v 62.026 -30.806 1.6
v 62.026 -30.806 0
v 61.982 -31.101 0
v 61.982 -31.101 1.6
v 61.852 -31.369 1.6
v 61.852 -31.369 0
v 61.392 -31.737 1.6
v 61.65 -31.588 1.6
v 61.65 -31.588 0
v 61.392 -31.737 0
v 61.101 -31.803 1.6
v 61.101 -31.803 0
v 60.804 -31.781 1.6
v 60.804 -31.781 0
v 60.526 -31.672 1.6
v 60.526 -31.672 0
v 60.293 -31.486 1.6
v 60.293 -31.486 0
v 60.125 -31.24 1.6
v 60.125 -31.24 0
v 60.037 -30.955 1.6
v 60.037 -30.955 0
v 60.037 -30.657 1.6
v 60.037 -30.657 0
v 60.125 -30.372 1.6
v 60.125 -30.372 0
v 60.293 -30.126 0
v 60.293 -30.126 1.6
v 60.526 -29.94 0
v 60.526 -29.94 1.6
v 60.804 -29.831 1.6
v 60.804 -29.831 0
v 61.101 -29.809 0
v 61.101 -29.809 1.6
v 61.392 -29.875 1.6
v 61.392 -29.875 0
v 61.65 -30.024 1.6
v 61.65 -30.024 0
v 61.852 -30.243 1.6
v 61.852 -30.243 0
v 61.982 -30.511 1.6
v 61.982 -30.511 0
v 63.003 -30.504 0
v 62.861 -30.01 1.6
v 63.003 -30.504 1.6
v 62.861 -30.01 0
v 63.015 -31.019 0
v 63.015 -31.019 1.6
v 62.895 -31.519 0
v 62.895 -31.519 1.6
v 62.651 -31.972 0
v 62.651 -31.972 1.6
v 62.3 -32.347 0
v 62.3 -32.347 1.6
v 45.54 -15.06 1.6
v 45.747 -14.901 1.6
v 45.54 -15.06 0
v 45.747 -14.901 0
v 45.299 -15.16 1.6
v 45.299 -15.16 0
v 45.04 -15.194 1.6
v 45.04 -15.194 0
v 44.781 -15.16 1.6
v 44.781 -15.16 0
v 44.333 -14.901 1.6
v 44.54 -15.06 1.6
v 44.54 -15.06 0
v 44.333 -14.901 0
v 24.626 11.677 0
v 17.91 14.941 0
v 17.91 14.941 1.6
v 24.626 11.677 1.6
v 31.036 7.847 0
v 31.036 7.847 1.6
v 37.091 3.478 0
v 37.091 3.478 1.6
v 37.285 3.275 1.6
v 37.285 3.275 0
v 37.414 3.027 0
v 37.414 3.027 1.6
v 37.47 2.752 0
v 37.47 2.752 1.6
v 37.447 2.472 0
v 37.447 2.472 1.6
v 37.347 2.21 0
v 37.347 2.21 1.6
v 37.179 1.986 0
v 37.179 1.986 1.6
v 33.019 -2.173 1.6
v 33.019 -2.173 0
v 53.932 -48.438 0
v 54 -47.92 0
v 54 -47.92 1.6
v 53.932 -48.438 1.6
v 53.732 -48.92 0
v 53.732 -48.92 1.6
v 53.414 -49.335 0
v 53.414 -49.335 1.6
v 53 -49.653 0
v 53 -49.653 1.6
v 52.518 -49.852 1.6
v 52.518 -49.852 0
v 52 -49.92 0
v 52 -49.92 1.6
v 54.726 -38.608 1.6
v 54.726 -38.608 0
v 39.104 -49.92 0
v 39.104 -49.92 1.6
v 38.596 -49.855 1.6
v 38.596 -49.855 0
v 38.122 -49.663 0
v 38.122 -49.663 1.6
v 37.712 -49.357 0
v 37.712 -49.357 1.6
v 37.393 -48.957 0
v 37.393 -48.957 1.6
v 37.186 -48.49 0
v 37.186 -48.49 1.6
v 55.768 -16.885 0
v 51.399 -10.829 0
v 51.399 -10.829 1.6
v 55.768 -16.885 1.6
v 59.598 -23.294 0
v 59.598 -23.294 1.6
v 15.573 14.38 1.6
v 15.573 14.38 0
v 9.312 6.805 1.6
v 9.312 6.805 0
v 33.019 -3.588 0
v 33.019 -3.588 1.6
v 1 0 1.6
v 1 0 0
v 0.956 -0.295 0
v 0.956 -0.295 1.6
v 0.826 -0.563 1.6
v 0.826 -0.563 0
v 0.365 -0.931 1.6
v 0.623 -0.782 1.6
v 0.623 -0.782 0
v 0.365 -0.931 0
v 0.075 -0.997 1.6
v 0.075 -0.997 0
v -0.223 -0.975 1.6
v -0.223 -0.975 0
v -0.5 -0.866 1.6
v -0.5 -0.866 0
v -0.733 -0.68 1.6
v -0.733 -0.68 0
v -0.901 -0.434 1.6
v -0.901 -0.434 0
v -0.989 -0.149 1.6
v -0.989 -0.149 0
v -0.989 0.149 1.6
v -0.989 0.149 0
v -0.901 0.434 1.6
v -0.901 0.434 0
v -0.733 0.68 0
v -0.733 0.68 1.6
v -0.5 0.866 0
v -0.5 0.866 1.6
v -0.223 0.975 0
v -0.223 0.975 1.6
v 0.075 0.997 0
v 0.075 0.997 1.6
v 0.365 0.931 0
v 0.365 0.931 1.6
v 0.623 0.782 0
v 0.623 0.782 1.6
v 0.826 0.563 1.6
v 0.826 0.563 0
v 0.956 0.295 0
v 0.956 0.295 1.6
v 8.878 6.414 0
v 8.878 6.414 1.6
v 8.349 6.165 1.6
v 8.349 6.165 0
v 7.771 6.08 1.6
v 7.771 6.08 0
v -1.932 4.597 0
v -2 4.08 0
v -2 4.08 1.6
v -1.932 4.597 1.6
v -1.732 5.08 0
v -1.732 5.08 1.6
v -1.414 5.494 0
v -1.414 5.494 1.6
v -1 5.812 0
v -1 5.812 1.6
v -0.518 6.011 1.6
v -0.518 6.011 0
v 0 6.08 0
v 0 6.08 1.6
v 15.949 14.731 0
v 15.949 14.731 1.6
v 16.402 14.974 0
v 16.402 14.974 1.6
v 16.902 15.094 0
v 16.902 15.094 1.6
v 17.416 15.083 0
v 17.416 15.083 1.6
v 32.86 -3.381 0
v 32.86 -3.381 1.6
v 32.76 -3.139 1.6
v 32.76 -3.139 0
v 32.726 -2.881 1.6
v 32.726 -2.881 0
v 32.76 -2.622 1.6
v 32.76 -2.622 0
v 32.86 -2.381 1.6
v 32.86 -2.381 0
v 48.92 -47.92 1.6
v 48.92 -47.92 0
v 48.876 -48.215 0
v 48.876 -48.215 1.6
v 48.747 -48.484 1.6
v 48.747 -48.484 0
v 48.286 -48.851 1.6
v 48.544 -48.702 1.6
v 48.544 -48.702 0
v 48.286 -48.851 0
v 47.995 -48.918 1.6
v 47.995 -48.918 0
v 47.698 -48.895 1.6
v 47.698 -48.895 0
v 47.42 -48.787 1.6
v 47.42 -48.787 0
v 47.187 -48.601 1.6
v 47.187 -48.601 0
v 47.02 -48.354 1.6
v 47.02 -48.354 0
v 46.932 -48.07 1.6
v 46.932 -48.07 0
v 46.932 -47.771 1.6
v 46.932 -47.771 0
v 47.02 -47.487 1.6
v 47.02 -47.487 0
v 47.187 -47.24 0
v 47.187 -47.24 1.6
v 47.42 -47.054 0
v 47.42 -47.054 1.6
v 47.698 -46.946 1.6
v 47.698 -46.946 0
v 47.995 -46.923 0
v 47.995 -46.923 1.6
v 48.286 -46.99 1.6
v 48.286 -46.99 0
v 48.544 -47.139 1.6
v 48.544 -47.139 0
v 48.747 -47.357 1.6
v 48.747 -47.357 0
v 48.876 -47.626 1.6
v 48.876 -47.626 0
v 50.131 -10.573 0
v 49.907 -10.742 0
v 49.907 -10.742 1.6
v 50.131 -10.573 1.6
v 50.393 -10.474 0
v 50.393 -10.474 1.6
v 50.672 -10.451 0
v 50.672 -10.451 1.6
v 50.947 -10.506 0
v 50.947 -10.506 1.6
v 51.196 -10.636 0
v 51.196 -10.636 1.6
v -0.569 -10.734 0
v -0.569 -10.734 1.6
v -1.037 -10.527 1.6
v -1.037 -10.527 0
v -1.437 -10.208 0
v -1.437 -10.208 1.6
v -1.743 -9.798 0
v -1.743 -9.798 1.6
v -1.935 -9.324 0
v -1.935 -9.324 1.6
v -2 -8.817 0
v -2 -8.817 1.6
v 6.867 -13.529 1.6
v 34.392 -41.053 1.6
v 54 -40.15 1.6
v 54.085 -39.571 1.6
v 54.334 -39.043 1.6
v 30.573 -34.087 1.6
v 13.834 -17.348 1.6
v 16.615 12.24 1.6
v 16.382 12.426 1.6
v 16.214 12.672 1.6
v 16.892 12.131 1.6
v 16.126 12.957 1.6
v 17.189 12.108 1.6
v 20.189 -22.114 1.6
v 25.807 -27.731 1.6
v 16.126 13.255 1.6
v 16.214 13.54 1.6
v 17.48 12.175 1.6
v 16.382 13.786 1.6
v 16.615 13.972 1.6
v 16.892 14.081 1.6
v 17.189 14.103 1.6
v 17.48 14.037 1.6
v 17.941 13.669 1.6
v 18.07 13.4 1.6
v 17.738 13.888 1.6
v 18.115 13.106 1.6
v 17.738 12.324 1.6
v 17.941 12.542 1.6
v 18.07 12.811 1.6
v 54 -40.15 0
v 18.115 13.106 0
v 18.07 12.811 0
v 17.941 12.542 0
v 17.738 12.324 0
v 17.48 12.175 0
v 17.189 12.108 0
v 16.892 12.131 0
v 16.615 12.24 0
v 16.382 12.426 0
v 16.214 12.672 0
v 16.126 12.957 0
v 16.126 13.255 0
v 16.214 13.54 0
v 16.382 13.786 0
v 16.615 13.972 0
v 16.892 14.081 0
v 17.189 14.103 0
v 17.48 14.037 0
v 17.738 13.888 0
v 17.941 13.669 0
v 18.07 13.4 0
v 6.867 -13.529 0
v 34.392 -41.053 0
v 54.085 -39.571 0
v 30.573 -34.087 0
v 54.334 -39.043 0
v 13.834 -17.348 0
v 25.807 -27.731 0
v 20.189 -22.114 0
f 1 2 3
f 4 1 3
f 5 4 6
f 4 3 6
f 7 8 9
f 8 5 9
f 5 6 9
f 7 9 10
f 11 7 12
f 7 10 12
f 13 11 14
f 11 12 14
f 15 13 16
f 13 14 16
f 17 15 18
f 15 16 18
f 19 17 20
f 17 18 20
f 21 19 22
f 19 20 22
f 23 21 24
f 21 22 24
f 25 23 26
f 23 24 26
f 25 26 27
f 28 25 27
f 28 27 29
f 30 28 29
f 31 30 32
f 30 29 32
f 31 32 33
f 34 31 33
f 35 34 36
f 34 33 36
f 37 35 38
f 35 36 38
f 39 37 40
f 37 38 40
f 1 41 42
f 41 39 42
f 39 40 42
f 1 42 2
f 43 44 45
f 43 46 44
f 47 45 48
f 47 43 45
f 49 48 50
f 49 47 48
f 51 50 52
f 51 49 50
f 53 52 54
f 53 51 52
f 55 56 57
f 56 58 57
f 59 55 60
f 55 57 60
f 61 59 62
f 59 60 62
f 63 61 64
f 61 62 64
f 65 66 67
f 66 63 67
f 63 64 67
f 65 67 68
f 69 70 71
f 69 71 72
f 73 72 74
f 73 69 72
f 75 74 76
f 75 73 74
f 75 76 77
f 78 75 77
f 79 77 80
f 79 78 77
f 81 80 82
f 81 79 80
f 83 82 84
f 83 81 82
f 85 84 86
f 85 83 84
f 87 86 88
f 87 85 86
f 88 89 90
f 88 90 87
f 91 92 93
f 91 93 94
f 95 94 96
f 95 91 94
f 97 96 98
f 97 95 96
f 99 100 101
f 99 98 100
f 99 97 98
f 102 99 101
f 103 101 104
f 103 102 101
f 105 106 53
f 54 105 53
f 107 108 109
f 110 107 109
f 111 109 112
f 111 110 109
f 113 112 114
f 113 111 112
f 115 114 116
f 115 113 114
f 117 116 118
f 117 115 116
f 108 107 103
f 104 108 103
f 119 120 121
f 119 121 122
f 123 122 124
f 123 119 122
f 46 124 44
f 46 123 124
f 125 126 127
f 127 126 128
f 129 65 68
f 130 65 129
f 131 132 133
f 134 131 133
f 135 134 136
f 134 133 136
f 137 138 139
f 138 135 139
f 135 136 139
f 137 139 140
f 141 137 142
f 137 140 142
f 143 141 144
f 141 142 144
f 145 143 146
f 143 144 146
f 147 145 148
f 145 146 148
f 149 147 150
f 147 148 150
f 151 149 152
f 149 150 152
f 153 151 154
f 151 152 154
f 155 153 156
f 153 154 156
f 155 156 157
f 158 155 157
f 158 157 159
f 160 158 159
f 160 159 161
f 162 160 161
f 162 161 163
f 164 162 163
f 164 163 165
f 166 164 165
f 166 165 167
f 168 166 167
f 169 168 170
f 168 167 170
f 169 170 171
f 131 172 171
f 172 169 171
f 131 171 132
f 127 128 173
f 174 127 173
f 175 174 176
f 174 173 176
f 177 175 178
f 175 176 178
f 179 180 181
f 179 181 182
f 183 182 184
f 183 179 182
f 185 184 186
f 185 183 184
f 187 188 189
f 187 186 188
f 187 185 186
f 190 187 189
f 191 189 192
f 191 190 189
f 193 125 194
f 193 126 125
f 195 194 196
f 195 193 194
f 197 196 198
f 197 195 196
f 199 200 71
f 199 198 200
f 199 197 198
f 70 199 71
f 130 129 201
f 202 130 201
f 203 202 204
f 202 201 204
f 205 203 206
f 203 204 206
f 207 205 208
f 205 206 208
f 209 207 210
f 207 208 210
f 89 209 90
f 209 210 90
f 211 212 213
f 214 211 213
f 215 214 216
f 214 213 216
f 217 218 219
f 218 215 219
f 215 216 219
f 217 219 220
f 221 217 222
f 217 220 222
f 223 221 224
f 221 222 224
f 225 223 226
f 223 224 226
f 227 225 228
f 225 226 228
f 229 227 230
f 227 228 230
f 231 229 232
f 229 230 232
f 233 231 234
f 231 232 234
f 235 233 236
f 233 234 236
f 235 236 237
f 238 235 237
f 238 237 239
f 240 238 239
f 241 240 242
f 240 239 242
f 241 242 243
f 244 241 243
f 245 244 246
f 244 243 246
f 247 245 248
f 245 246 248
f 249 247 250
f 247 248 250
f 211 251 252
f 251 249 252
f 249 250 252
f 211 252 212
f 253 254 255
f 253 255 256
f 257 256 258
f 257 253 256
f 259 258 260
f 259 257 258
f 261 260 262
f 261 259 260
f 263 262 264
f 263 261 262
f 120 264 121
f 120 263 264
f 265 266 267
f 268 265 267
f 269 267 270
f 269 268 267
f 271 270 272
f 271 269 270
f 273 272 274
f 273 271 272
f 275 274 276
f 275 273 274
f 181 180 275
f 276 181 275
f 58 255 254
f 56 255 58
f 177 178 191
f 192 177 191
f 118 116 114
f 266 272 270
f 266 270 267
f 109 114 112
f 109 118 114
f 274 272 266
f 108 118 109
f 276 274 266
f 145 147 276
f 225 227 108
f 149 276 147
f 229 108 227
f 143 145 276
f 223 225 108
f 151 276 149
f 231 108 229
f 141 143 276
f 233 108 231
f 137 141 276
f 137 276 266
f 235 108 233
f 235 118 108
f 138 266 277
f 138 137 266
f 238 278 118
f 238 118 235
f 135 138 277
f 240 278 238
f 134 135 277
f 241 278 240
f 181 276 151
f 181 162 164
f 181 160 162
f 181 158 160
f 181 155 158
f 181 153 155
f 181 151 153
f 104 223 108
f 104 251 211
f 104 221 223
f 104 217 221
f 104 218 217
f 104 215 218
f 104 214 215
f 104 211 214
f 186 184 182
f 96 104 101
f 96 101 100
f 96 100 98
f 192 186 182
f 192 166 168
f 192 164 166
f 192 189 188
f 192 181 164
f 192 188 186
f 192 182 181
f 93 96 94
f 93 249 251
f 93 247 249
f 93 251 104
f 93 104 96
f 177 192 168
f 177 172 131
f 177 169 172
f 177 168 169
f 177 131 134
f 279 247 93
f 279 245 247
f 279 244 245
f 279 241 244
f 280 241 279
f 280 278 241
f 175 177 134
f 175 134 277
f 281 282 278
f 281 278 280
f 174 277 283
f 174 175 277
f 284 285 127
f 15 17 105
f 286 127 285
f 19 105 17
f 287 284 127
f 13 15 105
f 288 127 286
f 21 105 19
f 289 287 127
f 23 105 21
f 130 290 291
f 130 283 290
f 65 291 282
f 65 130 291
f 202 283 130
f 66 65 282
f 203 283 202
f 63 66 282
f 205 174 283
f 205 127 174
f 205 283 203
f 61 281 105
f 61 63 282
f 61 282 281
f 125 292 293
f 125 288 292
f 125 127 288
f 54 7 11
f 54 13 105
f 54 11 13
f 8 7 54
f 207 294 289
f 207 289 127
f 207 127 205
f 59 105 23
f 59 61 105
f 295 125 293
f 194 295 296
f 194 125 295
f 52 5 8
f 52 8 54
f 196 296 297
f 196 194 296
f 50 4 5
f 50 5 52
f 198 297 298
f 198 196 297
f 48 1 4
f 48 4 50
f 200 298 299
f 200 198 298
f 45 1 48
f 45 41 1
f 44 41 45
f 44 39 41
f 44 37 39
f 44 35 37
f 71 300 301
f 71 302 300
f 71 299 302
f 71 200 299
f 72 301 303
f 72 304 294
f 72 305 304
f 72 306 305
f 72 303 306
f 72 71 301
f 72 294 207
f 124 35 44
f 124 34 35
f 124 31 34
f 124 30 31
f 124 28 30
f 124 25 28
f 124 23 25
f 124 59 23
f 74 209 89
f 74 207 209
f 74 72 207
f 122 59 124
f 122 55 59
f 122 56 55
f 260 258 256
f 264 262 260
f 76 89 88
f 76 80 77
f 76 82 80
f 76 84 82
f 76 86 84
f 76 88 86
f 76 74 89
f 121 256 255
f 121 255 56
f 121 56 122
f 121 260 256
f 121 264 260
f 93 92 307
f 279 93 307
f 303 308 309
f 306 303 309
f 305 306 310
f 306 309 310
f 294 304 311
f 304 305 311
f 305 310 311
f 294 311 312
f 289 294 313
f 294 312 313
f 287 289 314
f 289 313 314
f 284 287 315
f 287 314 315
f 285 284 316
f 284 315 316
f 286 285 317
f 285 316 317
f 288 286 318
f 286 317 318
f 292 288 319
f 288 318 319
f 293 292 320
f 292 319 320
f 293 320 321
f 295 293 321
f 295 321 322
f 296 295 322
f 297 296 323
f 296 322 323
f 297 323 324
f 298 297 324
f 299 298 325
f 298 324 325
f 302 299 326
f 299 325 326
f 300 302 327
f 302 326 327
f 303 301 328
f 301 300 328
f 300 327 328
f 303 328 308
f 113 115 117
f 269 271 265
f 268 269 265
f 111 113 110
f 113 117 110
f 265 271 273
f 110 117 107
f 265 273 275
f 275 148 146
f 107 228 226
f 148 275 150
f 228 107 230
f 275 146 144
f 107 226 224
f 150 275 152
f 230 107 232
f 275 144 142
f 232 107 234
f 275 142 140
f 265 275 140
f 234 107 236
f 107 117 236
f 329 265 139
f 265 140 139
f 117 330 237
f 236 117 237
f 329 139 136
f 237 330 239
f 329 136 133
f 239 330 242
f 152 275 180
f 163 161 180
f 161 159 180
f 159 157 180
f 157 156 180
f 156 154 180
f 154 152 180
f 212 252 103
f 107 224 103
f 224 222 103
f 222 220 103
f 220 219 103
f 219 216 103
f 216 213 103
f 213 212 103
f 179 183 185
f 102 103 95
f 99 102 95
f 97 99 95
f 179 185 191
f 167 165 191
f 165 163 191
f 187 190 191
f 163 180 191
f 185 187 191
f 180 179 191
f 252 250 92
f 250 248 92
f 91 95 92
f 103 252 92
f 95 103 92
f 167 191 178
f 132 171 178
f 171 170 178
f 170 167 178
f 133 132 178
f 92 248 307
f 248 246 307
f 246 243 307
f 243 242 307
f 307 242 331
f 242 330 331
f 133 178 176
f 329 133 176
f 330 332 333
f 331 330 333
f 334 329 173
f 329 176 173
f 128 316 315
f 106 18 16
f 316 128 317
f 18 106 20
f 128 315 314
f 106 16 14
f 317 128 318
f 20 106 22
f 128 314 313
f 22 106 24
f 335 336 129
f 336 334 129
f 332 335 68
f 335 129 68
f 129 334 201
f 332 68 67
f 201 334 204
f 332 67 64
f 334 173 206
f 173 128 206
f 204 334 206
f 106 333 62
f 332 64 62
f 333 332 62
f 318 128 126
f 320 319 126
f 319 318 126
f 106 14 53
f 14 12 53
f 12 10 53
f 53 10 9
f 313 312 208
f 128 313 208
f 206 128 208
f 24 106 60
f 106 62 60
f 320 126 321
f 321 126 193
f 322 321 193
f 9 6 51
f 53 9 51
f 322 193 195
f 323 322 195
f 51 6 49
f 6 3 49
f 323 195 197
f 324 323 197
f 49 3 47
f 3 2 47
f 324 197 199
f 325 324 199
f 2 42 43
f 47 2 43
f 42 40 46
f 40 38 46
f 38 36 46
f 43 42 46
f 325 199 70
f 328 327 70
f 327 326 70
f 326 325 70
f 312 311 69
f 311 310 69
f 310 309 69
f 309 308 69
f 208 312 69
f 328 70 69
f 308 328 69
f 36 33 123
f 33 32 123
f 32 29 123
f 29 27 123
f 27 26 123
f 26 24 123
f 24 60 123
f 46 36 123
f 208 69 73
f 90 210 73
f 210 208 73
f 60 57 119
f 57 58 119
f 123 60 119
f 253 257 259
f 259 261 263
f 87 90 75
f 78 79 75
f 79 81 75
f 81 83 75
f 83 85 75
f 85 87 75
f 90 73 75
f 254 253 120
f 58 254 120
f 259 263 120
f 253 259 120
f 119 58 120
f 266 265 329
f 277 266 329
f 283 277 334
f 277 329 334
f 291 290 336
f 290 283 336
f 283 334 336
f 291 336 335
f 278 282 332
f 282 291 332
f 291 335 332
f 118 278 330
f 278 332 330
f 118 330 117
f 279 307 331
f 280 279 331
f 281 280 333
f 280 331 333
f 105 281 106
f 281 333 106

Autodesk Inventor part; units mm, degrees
ref_plane "YZ Plane" through (0, 0, 0) normal (1, 0, 0) x (0, 1, 0)
ref_plane "XZ Plane" through (0, 0, 0) normal (0, 1, 0) x (-1, 0, 0)
ref_plane "XY Plane" through (0, 0, 0) normal (0, 0, 1) x (1, 0, 0)
sketch "スケッチ1" plane through (0, 0, 0) normal (0, 0, 1) x (1, 0, 0)
  line L0 (54, -47.9205) -> (54, -40.1498) projected
  arc A0 (54.7258, -38.6082) -> (54, -40.1498) centre (56, -40.1498) ccw projected
  line L1 (54.7258, -38.6082) -> (62.3004, -32.3475) projected
  arc A1 (62.3004, -32.3475) -> (62.8611, -30.0103) centre (61.0262, -30.8059) ccw projected
  arc A2 (62.8611, -30.0103) -> (17.9102, 14.9406) centre (-16.5, -64.4205) ccw projected
  arc A3 (17.9102, 14.9406) -> (15.573, 14.3799) centre (17.1146, 13.1057) ccw projected
  line L2 (15.573, 14.3799) -> (9.3123, 6.8053) projected
  arc A4 (7.7707, 6.0795) -> (9.3123, 6.8053) centre (7.7707, 8.0795) ccw projected
  line L3 (7.7707, 6.0795) -> (0, 6.0795) projected
  arc A5 (0, 6.0795) -> (-2, 4.0795) centre (0, 4.0795) ccw projected
  line L4 (-2, 4.0795) -> (-2, -8.817) projected
  arc A6 (-2, -8.817) -> (-0.569, -10.7343) centre (0, -8.817) ccw projected
  arc A7 (37.1861, -48.4895) -> (-0.569, -10.7343) centre (-16.5, -64.4205) ccw projected
  arc A8 (37.1861, -48.4895) -> (39.1035, -49.9205) centre (39.1035, -47.9205) ccw projected
  line L5 (39.1035, -49.9205) -> (52, -49.9205) projected
  arc A9 (52, -49.9205) -> (54, -47.9205) centre (52, -47.9205) ccw projected
  circle A10 centre (47.9205, -47.9205) radius 1 projected
  circle A11 centre (0, 0) radius 1 projected
  circle A12 centre (17.1146, 13.1057) radius 1 projected
  circle A13 centre (61.0262, -30.8059) radius 1 projected
  point P0 (0, 0)
extrude "押し出し1" add sketch "スケッチ1" along normal blind 1.6
sketch "スケッチ2" plane through (0, 0, 1.6) normal (0, 0, 1) x (1, 0, 0)
  arc A0 (37.1861, -48.4895) -> (-0.569, -10.7343) centre (-16.5, -64.4205) ccw projected
  arc A1 (47.8768, -47.7509) -> (0, 0) centre (-16.5, -64.4205) ccw
sketch "スケッチ3" plane through (0, 0, 1.6) normal (0, 0, 1) x (1, 0, 0)
  circle A0 centre (42.5969, -6.8792) radius 0.375 projected
  circle A1 centre (45.4254, -9.7076) radius 0.375 projected
  circle A2 centre (38.3543, -2.6366) radius 0.375 projected
  circle A3 centre (36.9401, -4.0508) radius 0.375 projected
  circle A4 centre (44.0111, -11.1218) radius 0.375 projected
  circle A5 centre (42.5969, -9.7076) radius 0.375 projected
  circle A6 centre (41.1827, -8.2934) radius 0.375 projected
  circle A7 centre (39.7685, -6.8792) radius 0.375 projected
  circle A8 centre (38.3543, -5.465) radius 0.375 projected
  circle A9 centre (44.0111, -8.2934) radius 0.375 projected
  circle A10 centre (39.7685, -4.0508) radius 0.375 projected
  circle A11 centre (41.1827, -5.465) radius 0.375 projected
  line L0 (39.1035, -49.9205) -> (52, -49.9205) projected
  arc A12 (52, -49.9205) -> (54, -47.9205) centre (52, -47.9205) ccw projected
  line L1 (54, -47.9205) -> (54, -40.1498) projected
  arc A13 (54.7258, -38.6082) -> (54, -40.1498) centre (56, -40.1498) ccw projected
  line L2 (54.7258, -38.6082) -> (62.3004, -32.3475) projected
  arc A14 (62.3004, -32.3475) -> (62.8611, -30.0103) centre (61.0262, -30.8059) ccw projected
  arc A15 (62.8611, -30.0103) -> (17.9102, 14.9406) centre (-16.5, -64.4205) ccw projected
  arc A16 (17.9102, 14.9406) -> (15.573, 14.3799) centre (17.1146, 13.1057) ccw projected
  line L3 (15.573, 14.3799) -> (9.3123, 6.8053) projected
  arc A17 (7.7707, 6.0795) -> (9.3123, 6.8053) centre (7.7707, 8.0795) ccw projected
  line L4 (7.7707, 6.0795) -> (0, 6.0795) projected
  arc A18 (0, 6.0795) -> (-2, 4.0795) centre (0, 4.0795) ccw projected
  line L5 (-2, 4.0795) -> (-2, -8.817) projected
  arc A19 (-2, -8.817) -> (-0.569, -10.7343) centre (0, -8.817) ccw projected
  arc A20 (37.1861, -48.4895) -> (-0.569, -10.7343) centre (-16.5, -64.4205) ccw projected
  arc A21 (37.1861, -48.4895) -> (39.1035, -49.9205) centre (39.1035, -47.9205) ccw projected
  circle A22 centre (17.1146, 13.1057) radius 1 projected
  circle A23 centre (61.0262, -30.8059) radius 1 projected
  circle A24 centre (0, 0) radius 1 projected
  circle A25 centre (47.9205, -47.9205) radius 1 projected
  line L6 (44.6647, -3.2558) -> (23.098, -24.8225) construction
  line L7 (50.6967, -9.9517) -> (45.0399, -15.6085)
  line L8 (45.0399, -15.6085) -> (32.3119, -2.8806)
  line L9 (32.3119, -2.8806) -> (37.9688, 2.7762)
  arc A26 (62.8611, -30.0103) -> (17.9102, 14.9406) centre (-16.5, -64.4205) ccw projected
  point P0 (0, 0)
  dimension "d2" = 18
  dimension "d3" = 8
extrude "押し出し2" cut sketch "スケッチ3" against normal up to surface (1.6 mm away) contours A0 | A1 | A2 | A3 | A4 | A5 | A6 | A7 | A8 | A9 | A10 | A11 | L7 L8 L9 A15
fillet "フィレット1" radius 1 4 edges at (50.6967, -9.9517, 0.8) (45.0399, -15.6085, 0.8) (32.3119, -2.8806, 0.8) (37.9688, 2.7762, 0.8)
properties part number "MotorDriver_PCB"
